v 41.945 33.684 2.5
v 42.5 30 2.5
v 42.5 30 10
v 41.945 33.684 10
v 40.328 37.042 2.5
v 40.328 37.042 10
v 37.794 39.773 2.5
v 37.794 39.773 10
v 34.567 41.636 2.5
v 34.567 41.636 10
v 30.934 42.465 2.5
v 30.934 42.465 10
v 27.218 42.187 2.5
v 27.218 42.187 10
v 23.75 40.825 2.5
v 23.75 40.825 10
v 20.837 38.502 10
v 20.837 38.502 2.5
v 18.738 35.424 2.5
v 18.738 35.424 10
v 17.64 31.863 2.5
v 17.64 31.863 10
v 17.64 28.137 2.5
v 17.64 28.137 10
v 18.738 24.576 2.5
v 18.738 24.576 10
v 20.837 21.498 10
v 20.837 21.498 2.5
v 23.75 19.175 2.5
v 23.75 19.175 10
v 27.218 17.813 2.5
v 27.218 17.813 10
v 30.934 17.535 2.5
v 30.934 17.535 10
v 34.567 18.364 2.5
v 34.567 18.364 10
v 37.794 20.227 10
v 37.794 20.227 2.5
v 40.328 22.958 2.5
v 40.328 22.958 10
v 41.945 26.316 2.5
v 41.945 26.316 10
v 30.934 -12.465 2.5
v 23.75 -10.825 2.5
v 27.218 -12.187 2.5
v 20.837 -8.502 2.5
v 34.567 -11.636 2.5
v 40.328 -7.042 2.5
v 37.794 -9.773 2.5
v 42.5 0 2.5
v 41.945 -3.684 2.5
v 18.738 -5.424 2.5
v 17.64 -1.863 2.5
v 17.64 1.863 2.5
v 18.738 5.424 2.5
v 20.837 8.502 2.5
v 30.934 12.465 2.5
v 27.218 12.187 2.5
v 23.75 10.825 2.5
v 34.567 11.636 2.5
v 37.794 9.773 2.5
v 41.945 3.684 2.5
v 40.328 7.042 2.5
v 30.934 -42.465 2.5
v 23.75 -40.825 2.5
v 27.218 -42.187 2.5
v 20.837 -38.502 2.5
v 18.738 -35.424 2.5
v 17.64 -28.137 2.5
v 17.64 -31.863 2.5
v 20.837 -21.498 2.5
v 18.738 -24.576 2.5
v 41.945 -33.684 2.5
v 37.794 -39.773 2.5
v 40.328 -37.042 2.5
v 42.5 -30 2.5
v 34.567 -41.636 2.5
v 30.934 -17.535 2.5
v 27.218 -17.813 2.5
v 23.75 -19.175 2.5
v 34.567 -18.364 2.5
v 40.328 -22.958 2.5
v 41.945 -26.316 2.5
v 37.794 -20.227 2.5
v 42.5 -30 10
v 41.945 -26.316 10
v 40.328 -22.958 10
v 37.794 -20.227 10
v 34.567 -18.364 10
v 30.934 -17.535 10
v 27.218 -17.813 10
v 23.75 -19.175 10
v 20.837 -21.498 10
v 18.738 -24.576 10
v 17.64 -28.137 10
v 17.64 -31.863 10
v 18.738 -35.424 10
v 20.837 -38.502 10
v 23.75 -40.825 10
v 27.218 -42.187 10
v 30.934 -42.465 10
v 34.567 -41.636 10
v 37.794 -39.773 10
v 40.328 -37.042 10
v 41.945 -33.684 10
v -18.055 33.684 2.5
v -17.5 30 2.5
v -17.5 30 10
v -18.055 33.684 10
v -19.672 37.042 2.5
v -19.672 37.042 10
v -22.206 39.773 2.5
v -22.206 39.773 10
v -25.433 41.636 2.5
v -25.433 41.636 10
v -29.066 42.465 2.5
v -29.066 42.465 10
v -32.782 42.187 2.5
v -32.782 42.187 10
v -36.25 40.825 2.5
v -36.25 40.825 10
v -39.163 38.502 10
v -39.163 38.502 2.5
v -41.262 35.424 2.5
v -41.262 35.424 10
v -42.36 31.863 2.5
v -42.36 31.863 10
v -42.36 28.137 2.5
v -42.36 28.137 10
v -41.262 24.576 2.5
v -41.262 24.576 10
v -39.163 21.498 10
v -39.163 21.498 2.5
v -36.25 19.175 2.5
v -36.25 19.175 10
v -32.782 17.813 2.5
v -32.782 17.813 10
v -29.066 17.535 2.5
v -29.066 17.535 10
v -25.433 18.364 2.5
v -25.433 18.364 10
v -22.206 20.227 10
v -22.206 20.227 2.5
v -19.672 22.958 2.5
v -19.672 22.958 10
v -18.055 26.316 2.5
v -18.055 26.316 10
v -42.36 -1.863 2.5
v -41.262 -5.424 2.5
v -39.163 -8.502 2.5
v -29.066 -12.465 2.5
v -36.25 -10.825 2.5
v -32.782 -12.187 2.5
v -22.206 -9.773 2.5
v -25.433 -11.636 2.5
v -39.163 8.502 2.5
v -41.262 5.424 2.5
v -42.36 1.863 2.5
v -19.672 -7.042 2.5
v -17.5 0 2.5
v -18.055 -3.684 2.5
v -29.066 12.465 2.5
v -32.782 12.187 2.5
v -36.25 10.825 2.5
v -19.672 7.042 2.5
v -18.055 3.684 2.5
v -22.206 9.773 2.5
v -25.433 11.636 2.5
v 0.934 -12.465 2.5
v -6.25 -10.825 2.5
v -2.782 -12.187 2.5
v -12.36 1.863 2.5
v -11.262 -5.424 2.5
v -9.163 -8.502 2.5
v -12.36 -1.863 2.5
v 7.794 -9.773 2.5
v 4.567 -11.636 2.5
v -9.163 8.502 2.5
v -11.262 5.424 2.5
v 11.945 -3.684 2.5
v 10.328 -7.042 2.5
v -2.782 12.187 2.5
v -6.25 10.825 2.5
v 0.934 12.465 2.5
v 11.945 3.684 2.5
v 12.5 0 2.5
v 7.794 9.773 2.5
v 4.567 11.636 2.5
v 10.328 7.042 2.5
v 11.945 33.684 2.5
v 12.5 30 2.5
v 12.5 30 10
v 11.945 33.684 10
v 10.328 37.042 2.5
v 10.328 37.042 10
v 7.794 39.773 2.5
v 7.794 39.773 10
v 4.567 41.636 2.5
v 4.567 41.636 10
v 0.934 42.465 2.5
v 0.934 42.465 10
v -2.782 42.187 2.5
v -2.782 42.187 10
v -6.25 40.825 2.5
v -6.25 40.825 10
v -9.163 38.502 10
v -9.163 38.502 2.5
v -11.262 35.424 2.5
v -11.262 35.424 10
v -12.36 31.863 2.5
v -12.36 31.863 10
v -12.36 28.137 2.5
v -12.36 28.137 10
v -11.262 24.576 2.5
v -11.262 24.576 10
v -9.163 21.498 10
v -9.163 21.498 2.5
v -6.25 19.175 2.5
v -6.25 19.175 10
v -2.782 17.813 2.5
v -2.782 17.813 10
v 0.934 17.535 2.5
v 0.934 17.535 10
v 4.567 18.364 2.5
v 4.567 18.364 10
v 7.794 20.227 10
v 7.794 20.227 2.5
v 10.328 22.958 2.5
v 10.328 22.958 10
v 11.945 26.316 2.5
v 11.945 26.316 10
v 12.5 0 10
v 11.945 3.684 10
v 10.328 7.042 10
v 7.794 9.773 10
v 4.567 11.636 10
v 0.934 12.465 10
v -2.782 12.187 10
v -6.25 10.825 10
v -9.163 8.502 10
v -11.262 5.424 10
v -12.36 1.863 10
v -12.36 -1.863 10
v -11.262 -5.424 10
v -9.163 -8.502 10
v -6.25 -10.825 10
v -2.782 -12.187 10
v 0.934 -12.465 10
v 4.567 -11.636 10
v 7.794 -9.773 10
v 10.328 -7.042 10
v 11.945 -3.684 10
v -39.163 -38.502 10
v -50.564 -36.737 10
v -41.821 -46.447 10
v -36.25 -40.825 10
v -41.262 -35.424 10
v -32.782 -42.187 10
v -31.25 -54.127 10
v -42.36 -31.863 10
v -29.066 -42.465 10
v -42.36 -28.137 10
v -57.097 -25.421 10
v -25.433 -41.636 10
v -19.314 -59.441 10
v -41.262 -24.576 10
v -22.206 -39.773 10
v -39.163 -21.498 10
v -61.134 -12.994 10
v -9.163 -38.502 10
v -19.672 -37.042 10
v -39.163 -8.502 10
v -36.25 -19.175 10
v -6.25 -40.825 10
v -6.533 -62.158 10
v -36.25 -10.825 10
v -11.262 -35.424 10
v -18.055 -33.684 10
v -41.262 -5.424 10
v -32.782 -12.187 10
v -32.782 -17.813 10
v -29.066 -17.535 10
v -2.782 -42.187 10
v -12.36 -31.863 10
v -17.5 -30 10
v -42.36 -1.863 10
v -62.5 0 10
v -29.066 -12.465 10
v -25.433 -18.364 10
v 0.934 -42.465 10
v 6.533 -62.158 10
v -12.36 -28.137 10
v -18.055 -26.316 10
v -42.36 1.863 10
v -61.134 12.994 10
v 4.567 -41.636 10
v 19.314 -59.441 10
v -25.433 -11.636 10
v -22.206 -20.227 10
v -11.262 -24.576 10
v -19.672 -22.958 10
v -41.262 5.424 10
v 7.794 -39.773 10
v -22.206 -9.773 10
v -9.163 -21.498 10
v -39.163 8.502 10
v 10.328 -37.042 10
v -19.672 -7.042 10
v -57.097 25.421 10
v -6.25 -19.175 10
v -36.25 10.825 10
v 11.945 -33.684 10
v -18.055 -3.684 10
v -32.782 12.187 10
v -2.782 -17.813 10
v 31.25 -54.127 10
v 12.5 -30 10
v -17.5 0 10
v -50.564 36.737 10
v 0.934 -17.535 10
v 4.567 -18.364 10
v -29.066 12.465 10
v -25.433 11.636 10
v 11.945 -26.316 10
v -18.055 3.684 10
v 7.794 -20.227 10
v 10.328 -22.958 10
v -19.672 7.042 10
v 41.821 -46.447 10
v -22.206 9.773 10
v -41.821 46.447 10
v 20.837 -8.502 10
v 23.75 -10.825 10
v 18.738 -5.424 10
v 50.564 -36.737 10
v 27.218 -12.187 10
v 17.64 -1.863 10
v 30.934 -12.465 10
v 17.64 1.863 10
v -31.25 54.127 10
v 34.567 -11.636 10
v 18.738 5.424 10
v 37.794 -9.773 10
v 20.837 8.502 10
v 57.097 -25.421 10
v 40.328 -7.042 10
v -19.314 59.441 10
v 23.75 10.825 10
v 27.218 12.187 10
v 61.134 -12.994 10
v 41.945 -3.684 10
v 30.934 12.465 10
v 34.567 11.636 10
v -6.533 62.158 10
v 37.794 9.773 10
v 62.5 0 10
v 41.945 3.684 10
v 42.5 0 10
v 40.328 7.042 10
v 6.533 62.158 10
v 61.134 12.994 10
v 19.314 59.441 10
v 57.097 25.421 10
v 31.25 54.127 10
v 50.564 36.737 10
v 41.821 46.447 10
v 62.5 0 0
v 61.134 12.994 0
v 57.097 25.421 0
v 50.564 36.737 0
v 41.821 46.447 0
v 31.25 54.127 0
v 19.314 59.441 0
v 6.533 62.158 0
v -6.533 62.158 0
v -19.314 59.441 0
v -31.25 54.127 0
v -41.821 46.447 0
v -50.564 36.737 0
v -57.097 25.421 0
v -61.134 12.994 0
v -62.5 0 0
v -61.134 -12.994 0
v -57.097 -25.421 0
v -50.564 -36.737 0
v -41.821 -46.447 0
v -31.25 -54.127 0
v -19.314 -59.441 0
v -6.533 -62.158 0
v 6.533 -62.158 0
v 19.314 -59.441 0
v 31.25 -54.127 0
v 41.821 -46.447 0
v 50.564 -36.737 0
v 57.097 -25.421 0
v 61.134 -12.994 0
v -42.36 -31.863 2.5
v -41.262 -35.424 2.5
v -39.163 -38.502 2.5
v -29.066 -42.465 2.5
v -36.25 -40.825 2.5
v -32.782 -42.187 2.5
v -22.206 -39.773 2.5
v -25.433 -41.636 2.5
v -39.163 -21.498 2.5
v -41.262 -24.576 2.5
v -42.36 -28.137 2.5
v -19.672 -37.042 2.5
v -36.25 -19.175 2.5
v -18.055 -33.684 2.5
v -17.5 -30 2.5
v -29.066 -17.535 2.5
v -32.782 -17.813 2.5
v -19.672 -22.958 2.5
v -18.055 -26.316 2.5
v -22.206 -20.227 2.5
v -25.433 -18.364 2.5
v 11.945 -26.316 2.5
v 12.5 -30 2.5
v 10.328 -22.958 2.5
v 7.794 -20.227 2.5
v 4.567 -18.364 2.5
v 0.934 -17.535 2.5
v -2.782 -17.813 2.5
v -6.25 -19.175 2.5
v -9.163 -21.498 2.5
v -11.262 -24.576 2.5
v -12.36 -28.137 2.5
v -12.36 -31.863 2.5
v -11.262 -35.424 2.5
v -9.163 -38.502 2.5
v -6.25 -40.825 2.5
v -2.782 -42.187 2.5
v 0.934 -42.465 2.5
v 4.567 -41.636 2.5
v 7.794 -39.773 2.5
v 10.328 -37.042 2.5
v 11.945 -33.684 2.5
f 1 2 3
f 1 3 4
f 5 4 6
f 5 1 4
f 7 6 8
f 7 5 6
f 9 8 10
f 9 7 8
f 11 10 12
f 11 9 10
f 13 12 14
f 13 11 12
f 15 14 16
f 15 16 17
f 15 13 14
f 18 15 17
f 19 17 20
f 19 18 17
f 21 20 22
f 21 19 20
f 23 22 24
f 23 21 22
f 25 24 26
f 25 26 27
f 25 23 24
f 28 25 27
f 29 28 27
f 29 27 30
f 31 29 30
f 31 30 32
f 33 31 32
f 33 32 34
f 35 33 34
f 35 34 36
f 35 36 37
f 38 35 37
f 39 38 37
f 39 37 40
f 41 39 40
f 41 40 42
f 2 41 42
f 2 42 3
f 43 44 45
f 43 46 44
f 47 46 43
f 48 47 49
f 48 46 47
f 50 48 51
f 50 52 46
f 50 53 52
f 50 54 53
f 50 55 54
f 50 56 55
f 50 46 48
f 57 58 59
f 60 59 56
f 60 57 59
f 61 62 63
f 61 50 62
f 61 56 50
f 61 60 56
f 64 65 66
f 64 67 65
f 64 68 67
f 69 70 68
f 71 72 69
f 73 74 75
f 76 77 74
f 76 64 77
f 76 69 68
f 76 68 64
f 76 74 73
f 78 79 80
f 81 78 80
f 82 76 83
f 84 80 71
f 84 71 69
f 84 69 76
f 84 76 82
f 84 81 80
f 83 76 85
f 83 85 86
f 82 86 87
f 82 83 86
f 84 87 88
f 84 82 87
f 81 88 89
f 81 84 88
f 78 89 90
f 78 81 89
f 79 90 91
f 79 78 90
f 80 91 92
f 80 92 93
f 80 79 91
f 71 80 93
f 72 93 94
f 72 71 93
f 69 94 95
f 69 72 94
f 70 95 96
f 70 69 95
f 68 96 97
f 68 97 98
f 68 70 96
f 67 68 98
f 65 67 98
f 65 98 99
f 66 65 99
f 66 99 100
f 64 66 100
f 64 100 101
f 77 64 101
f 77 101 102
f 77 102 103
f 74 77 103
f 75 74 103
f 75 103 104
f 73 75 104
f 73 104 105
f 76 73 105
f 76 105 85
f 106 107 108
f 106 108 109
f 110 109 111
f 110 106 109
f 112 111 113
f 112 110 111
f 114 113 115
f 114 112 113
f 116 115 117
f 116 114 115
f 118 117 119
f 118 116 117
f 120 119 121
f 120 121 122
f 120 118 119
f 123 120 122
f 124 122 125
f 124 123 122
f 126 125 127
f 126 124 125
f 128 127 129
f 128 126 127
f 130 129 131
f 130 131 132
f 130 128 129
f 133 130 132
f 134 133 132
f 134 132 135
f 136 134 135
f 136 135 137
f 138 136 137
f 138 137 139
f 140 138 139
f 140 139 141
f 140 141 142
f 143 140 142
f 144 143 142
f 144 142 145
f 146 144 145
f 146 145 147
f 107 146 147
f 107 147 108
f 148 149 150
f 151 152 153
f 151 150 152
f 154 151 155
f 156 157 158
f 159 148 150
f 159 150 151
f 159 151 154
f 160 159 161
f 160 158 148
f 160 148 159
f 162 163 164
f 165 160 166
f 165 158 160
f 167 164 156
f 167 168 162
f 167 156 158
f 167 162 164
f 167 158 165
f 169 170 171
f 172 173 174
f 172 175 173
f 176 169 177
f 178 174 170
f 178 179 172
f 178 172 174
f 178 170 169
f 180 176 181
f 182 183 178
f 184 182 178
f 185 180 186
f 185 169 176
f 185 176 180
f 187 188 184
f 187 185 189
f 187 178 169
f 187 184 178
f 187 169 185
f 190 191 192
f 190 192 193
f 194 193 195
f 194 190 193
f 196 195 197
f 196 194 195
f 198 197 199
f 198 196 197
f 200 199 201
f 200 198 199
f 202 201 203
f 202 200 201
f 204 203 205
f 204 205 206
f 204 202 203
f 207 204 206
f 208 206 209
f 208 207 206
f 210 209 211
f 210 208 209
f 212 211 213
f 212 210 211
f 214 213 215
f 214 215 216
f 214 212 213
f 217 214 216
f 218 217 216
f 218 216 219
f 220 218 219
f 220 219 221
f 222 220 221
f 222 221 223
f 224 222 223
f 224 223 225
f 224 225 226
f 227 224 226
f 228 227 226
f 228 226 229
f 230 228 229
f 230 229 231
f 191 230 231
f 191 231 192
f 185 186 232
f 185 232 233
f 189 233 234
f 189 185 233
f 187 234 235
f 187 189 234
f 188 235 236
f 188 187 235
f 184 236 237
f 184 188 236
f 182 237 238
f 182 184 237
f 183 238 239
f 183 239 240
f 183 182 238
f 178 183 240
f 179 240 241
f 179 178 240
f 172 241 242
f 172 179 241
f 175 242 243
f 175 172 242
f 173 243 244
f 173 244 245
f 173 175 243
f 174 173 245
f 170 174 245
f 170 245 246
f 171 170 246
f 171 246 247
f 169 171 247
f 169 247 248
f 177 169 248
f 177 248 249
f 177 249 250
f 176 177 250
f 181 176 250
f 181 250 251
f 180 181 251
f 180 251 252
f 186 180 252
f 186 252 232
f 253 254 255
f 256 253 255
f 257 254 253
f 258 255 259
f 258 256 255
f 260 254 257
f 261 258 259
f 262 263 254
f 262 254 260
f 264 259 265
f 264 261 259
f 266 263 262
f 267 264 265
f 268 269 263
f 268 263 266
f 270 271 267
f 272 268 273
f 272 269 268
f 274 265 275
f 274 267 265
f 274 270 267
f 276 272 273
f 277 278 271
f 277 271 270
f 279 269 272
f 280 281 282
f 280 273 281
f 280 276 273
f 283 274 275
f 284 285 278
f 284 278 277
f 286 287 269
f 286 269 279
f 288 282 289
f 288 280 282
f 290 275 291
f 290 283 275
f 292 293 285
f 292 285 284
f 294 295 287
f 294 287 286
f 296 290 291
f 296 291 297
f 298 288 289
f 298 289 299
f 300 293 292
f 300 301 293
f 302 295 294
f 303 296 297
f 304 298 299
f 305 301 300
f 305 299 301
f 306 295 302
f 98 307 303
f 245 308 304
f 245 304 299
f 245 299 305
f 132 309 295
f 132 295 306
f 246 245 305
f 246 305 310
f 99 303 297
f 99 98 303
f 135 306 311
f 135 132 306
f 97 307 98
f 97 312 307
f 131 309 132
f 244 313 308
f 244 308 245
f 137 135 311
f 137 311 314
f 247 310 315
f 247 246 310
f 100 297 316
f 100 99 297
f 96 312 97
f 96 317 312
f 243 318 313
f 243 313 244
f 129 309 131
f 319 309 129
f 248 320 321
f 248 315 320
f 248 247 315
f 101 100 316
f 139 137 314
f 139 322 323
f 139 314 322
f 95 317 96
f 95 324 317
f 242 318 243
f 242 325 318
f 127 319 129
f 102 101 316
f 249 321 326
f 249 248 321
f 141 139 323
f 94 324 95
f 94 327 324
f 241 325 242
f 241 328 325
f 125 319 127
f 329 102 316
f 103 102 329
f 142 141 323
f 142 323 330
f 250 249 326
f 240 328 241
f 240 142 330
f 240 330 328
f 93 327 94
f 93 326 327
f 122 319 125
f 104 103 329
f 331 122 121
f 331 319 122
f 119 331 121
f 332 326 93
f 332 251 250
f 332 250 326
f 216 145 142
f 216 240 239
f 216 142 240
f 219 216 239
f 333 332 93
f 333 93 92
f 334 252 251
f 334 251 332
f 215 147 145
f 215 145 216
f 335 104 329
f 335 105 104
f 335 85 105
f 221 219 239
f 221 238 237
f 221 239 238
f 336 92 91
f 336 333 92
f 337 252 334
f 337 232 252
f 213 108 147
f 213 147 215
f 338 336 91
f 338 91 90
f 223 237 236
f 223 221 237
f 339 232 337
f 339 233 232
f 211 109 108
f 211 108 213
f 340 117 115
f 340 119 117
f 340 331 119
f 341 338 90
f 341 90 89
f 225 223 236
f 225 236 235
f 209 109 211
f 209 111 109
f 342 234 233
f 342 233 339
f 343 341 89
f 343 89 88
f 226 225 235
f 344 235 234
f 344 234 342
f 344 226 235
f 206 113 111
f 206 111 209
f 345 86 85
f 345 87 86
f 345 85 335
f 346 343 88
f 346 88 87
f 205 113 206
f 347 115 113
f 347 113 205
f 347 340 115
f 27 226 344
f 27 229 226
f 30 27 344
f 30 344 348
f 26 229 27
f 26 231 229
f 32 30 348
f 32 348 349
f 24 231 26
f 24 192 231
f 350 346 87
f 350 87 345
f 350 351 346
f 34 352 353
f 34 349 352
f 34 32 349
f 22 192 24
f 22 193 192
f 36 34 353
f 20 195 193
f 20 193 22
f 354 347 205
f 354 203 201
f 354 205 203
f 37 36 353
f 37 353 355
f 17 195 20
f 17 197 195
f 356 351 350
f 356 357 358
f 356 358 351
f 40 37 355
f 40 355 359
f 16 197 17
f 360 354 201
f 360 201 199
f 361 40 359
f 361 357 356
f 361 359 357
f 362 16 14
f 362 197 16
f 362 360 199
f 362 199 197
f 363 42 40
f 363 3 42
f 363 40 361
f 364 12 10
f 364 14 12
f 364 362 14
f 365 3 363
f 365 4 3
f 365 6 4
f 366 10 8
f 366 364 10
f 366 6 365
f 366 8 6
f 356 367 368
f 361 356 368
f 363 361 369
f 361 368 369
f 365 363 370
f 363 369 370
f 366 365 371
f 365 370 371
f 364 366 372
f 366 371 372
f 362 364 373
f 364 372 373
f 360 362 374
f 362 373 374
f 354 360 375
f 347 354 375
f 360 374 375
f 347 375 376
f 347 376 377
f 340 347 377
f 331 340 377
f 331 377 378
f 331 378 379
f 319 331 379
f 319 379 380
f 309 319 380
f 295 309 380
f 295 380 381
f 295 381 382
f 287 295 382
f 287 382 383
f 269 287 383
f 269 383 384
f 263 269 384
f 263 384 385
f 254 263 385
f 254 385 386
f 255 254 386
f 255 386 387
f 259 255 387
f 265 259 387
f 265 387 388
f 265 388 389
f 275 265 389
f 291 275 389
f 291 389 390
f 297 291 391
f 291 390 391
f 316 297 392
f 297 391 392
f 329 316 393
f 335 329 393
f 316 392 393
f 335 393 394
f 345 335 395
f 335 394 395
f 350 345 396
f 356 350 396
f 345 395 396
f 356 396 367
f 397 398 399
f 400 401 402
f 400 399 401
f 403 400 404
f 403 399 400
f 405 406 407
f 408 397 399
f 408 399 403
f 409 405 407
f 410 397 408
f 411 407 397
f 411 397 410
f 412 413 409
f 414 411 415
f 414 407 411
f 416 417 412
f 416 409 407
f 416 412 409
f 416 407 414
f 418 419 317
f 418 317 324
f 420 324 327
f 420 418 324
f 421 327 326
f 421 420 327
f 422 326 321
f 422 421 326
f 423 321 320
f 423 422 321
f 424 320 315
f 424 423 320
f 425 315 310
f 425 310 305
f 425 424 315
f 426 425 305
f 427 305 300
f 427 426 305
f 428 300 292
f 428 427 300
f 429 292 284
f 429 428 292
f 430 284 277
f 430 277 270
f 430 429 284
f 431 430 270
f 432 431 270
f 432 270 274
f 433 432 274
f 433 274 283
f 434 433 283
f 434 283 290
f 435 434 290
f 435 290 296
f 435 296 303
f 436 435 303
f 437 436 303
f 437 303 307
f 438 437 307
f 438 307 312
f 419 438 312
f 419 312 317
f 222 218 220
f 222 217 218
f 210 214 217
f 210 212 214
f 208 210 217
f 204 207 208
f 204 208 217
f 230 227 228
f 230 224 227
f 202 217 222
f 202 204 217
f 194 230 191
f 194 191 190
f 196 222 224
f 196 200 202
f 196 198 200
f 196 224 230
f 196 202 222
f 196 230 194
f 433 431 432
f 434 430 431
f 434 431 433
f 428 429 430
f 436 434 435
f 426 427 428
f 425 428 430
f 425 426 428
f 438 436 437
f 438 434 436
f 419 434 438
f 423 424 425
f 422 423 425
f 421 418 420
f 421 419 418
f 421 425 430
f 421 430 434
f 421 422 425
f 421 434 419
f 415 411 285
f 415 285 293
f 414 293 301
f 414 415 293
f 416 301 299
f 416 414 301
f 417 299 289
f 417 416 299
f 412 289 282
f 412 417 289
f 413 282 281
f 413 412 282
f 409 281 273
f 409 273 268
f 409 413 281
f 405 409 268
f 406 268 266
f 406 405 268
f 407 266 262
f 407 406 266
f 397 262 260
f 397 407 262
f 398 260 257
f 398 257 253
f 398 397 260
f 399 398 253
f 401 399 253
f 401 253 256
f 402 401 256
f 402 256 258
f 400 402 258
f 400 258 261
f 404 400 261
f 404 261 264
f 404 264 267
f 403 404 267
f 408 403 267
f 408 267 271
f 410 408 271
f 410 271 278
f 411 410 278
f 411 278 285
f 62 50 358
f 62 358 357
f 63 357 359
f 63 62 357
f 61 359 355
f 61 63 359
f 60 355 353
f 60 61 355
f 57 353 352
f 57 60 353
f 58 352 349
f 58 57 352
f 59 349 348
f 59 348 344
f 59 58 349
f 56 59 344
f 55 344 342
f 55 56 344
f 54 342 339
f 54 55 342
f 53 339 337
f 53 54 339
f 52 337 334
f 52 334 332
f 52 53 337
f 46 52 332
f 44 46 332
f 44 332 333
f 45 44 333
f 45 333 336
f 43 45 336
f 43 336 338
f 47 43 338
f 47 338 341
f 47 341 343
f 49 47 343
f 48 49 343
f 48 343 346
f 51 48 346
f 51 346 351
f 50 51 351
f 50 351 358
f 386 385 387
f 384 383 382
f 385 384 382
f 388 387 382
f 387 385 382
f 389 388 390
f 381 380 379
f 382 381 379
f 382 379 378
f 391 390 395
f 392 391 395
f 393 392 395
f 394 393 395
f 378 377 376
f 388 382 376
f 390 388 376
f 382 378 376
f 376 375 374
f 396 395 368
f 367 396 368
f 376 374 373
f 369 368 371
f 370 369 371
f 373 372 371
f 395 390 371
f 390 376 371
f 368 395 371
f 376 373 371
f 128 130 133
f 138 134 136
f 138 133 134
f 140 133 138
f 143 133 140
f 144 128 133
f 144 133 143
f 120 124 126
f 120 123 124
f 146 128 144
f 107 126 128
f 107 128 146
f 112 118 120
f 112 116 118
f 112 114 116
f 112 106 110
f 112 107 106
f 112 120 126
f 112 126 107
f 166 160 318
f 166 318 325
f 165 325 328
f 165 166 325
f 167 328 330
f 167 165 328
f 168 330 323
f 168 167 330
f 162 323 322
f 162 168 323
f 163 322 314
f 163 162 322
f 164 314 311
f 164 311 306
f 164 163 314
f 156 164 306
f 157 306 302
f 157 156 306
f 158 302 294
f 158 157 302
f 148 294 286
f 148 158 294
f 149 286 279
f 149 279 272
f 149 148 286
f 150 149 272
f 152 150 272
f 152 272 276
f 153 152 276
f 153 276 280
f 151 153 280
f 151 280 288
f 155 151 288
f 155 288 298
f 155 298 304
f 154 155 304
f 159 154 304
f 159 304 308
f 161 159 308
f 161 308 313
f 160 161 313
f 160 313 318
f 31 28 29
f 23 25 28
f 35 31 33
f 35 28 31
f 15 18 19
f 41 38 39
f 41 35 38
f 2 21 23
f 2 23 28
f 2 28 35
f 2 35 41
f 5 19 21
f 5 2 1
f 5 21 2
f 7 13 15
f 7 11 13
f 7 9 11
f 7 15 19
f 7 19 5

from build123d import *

# Parameters (mm, degrees)
F0_R     = 62.5
F0_R_2   = 12.5
F1_DEPTH = 10
F2_R     = 62.5
F3_DEPTH = 2.5


with BuildPart() as f1:
    # F0 (on Top) → F1 (new body)
    with BuildSketch(Plane.XY):
        Circle(F0_R)
        with Locations((-30, -30)):
            Circle(F0_R_2, mode=Mode.SUBTRACT)
        with Locations((0, -30)):
            Circle(F0_R_2, mode=Mode.SUBTRACT)
        with Locations((30, -30)):
            Circle(F0_R_2, mode=Mode.SUBTRACT)
        with Locations((-30, 0)):
            Circle(F0_R_2, mode=Mode.SUBTRACT)
        with Locations((-30, 30)):
            Circle(F0_R_2, mode=Mode.SUBTRACT)
        Circle(F0_R_2, mode=Mode.SUBTRACT)
        with Locations((30, 0)):
            Circle(F0_R_2, mode=Mode.SUBTRACT)
        with Locations((0, 30)):
            Circle(F0_R_2, mode=Mode.SUBTRACT)
        with Locations((30, 30)):
            Circle(F0_R_2, mode=Mode.SUBTRACT)
    extrude(amount=F1_DEPTH)

    # F2 (on Top) → F3 (join)
    with BuildSketch(Plane.XY):
        Circle(F2_R)
    extrude(amount=F3_DEPTH)


solid = f1.part
